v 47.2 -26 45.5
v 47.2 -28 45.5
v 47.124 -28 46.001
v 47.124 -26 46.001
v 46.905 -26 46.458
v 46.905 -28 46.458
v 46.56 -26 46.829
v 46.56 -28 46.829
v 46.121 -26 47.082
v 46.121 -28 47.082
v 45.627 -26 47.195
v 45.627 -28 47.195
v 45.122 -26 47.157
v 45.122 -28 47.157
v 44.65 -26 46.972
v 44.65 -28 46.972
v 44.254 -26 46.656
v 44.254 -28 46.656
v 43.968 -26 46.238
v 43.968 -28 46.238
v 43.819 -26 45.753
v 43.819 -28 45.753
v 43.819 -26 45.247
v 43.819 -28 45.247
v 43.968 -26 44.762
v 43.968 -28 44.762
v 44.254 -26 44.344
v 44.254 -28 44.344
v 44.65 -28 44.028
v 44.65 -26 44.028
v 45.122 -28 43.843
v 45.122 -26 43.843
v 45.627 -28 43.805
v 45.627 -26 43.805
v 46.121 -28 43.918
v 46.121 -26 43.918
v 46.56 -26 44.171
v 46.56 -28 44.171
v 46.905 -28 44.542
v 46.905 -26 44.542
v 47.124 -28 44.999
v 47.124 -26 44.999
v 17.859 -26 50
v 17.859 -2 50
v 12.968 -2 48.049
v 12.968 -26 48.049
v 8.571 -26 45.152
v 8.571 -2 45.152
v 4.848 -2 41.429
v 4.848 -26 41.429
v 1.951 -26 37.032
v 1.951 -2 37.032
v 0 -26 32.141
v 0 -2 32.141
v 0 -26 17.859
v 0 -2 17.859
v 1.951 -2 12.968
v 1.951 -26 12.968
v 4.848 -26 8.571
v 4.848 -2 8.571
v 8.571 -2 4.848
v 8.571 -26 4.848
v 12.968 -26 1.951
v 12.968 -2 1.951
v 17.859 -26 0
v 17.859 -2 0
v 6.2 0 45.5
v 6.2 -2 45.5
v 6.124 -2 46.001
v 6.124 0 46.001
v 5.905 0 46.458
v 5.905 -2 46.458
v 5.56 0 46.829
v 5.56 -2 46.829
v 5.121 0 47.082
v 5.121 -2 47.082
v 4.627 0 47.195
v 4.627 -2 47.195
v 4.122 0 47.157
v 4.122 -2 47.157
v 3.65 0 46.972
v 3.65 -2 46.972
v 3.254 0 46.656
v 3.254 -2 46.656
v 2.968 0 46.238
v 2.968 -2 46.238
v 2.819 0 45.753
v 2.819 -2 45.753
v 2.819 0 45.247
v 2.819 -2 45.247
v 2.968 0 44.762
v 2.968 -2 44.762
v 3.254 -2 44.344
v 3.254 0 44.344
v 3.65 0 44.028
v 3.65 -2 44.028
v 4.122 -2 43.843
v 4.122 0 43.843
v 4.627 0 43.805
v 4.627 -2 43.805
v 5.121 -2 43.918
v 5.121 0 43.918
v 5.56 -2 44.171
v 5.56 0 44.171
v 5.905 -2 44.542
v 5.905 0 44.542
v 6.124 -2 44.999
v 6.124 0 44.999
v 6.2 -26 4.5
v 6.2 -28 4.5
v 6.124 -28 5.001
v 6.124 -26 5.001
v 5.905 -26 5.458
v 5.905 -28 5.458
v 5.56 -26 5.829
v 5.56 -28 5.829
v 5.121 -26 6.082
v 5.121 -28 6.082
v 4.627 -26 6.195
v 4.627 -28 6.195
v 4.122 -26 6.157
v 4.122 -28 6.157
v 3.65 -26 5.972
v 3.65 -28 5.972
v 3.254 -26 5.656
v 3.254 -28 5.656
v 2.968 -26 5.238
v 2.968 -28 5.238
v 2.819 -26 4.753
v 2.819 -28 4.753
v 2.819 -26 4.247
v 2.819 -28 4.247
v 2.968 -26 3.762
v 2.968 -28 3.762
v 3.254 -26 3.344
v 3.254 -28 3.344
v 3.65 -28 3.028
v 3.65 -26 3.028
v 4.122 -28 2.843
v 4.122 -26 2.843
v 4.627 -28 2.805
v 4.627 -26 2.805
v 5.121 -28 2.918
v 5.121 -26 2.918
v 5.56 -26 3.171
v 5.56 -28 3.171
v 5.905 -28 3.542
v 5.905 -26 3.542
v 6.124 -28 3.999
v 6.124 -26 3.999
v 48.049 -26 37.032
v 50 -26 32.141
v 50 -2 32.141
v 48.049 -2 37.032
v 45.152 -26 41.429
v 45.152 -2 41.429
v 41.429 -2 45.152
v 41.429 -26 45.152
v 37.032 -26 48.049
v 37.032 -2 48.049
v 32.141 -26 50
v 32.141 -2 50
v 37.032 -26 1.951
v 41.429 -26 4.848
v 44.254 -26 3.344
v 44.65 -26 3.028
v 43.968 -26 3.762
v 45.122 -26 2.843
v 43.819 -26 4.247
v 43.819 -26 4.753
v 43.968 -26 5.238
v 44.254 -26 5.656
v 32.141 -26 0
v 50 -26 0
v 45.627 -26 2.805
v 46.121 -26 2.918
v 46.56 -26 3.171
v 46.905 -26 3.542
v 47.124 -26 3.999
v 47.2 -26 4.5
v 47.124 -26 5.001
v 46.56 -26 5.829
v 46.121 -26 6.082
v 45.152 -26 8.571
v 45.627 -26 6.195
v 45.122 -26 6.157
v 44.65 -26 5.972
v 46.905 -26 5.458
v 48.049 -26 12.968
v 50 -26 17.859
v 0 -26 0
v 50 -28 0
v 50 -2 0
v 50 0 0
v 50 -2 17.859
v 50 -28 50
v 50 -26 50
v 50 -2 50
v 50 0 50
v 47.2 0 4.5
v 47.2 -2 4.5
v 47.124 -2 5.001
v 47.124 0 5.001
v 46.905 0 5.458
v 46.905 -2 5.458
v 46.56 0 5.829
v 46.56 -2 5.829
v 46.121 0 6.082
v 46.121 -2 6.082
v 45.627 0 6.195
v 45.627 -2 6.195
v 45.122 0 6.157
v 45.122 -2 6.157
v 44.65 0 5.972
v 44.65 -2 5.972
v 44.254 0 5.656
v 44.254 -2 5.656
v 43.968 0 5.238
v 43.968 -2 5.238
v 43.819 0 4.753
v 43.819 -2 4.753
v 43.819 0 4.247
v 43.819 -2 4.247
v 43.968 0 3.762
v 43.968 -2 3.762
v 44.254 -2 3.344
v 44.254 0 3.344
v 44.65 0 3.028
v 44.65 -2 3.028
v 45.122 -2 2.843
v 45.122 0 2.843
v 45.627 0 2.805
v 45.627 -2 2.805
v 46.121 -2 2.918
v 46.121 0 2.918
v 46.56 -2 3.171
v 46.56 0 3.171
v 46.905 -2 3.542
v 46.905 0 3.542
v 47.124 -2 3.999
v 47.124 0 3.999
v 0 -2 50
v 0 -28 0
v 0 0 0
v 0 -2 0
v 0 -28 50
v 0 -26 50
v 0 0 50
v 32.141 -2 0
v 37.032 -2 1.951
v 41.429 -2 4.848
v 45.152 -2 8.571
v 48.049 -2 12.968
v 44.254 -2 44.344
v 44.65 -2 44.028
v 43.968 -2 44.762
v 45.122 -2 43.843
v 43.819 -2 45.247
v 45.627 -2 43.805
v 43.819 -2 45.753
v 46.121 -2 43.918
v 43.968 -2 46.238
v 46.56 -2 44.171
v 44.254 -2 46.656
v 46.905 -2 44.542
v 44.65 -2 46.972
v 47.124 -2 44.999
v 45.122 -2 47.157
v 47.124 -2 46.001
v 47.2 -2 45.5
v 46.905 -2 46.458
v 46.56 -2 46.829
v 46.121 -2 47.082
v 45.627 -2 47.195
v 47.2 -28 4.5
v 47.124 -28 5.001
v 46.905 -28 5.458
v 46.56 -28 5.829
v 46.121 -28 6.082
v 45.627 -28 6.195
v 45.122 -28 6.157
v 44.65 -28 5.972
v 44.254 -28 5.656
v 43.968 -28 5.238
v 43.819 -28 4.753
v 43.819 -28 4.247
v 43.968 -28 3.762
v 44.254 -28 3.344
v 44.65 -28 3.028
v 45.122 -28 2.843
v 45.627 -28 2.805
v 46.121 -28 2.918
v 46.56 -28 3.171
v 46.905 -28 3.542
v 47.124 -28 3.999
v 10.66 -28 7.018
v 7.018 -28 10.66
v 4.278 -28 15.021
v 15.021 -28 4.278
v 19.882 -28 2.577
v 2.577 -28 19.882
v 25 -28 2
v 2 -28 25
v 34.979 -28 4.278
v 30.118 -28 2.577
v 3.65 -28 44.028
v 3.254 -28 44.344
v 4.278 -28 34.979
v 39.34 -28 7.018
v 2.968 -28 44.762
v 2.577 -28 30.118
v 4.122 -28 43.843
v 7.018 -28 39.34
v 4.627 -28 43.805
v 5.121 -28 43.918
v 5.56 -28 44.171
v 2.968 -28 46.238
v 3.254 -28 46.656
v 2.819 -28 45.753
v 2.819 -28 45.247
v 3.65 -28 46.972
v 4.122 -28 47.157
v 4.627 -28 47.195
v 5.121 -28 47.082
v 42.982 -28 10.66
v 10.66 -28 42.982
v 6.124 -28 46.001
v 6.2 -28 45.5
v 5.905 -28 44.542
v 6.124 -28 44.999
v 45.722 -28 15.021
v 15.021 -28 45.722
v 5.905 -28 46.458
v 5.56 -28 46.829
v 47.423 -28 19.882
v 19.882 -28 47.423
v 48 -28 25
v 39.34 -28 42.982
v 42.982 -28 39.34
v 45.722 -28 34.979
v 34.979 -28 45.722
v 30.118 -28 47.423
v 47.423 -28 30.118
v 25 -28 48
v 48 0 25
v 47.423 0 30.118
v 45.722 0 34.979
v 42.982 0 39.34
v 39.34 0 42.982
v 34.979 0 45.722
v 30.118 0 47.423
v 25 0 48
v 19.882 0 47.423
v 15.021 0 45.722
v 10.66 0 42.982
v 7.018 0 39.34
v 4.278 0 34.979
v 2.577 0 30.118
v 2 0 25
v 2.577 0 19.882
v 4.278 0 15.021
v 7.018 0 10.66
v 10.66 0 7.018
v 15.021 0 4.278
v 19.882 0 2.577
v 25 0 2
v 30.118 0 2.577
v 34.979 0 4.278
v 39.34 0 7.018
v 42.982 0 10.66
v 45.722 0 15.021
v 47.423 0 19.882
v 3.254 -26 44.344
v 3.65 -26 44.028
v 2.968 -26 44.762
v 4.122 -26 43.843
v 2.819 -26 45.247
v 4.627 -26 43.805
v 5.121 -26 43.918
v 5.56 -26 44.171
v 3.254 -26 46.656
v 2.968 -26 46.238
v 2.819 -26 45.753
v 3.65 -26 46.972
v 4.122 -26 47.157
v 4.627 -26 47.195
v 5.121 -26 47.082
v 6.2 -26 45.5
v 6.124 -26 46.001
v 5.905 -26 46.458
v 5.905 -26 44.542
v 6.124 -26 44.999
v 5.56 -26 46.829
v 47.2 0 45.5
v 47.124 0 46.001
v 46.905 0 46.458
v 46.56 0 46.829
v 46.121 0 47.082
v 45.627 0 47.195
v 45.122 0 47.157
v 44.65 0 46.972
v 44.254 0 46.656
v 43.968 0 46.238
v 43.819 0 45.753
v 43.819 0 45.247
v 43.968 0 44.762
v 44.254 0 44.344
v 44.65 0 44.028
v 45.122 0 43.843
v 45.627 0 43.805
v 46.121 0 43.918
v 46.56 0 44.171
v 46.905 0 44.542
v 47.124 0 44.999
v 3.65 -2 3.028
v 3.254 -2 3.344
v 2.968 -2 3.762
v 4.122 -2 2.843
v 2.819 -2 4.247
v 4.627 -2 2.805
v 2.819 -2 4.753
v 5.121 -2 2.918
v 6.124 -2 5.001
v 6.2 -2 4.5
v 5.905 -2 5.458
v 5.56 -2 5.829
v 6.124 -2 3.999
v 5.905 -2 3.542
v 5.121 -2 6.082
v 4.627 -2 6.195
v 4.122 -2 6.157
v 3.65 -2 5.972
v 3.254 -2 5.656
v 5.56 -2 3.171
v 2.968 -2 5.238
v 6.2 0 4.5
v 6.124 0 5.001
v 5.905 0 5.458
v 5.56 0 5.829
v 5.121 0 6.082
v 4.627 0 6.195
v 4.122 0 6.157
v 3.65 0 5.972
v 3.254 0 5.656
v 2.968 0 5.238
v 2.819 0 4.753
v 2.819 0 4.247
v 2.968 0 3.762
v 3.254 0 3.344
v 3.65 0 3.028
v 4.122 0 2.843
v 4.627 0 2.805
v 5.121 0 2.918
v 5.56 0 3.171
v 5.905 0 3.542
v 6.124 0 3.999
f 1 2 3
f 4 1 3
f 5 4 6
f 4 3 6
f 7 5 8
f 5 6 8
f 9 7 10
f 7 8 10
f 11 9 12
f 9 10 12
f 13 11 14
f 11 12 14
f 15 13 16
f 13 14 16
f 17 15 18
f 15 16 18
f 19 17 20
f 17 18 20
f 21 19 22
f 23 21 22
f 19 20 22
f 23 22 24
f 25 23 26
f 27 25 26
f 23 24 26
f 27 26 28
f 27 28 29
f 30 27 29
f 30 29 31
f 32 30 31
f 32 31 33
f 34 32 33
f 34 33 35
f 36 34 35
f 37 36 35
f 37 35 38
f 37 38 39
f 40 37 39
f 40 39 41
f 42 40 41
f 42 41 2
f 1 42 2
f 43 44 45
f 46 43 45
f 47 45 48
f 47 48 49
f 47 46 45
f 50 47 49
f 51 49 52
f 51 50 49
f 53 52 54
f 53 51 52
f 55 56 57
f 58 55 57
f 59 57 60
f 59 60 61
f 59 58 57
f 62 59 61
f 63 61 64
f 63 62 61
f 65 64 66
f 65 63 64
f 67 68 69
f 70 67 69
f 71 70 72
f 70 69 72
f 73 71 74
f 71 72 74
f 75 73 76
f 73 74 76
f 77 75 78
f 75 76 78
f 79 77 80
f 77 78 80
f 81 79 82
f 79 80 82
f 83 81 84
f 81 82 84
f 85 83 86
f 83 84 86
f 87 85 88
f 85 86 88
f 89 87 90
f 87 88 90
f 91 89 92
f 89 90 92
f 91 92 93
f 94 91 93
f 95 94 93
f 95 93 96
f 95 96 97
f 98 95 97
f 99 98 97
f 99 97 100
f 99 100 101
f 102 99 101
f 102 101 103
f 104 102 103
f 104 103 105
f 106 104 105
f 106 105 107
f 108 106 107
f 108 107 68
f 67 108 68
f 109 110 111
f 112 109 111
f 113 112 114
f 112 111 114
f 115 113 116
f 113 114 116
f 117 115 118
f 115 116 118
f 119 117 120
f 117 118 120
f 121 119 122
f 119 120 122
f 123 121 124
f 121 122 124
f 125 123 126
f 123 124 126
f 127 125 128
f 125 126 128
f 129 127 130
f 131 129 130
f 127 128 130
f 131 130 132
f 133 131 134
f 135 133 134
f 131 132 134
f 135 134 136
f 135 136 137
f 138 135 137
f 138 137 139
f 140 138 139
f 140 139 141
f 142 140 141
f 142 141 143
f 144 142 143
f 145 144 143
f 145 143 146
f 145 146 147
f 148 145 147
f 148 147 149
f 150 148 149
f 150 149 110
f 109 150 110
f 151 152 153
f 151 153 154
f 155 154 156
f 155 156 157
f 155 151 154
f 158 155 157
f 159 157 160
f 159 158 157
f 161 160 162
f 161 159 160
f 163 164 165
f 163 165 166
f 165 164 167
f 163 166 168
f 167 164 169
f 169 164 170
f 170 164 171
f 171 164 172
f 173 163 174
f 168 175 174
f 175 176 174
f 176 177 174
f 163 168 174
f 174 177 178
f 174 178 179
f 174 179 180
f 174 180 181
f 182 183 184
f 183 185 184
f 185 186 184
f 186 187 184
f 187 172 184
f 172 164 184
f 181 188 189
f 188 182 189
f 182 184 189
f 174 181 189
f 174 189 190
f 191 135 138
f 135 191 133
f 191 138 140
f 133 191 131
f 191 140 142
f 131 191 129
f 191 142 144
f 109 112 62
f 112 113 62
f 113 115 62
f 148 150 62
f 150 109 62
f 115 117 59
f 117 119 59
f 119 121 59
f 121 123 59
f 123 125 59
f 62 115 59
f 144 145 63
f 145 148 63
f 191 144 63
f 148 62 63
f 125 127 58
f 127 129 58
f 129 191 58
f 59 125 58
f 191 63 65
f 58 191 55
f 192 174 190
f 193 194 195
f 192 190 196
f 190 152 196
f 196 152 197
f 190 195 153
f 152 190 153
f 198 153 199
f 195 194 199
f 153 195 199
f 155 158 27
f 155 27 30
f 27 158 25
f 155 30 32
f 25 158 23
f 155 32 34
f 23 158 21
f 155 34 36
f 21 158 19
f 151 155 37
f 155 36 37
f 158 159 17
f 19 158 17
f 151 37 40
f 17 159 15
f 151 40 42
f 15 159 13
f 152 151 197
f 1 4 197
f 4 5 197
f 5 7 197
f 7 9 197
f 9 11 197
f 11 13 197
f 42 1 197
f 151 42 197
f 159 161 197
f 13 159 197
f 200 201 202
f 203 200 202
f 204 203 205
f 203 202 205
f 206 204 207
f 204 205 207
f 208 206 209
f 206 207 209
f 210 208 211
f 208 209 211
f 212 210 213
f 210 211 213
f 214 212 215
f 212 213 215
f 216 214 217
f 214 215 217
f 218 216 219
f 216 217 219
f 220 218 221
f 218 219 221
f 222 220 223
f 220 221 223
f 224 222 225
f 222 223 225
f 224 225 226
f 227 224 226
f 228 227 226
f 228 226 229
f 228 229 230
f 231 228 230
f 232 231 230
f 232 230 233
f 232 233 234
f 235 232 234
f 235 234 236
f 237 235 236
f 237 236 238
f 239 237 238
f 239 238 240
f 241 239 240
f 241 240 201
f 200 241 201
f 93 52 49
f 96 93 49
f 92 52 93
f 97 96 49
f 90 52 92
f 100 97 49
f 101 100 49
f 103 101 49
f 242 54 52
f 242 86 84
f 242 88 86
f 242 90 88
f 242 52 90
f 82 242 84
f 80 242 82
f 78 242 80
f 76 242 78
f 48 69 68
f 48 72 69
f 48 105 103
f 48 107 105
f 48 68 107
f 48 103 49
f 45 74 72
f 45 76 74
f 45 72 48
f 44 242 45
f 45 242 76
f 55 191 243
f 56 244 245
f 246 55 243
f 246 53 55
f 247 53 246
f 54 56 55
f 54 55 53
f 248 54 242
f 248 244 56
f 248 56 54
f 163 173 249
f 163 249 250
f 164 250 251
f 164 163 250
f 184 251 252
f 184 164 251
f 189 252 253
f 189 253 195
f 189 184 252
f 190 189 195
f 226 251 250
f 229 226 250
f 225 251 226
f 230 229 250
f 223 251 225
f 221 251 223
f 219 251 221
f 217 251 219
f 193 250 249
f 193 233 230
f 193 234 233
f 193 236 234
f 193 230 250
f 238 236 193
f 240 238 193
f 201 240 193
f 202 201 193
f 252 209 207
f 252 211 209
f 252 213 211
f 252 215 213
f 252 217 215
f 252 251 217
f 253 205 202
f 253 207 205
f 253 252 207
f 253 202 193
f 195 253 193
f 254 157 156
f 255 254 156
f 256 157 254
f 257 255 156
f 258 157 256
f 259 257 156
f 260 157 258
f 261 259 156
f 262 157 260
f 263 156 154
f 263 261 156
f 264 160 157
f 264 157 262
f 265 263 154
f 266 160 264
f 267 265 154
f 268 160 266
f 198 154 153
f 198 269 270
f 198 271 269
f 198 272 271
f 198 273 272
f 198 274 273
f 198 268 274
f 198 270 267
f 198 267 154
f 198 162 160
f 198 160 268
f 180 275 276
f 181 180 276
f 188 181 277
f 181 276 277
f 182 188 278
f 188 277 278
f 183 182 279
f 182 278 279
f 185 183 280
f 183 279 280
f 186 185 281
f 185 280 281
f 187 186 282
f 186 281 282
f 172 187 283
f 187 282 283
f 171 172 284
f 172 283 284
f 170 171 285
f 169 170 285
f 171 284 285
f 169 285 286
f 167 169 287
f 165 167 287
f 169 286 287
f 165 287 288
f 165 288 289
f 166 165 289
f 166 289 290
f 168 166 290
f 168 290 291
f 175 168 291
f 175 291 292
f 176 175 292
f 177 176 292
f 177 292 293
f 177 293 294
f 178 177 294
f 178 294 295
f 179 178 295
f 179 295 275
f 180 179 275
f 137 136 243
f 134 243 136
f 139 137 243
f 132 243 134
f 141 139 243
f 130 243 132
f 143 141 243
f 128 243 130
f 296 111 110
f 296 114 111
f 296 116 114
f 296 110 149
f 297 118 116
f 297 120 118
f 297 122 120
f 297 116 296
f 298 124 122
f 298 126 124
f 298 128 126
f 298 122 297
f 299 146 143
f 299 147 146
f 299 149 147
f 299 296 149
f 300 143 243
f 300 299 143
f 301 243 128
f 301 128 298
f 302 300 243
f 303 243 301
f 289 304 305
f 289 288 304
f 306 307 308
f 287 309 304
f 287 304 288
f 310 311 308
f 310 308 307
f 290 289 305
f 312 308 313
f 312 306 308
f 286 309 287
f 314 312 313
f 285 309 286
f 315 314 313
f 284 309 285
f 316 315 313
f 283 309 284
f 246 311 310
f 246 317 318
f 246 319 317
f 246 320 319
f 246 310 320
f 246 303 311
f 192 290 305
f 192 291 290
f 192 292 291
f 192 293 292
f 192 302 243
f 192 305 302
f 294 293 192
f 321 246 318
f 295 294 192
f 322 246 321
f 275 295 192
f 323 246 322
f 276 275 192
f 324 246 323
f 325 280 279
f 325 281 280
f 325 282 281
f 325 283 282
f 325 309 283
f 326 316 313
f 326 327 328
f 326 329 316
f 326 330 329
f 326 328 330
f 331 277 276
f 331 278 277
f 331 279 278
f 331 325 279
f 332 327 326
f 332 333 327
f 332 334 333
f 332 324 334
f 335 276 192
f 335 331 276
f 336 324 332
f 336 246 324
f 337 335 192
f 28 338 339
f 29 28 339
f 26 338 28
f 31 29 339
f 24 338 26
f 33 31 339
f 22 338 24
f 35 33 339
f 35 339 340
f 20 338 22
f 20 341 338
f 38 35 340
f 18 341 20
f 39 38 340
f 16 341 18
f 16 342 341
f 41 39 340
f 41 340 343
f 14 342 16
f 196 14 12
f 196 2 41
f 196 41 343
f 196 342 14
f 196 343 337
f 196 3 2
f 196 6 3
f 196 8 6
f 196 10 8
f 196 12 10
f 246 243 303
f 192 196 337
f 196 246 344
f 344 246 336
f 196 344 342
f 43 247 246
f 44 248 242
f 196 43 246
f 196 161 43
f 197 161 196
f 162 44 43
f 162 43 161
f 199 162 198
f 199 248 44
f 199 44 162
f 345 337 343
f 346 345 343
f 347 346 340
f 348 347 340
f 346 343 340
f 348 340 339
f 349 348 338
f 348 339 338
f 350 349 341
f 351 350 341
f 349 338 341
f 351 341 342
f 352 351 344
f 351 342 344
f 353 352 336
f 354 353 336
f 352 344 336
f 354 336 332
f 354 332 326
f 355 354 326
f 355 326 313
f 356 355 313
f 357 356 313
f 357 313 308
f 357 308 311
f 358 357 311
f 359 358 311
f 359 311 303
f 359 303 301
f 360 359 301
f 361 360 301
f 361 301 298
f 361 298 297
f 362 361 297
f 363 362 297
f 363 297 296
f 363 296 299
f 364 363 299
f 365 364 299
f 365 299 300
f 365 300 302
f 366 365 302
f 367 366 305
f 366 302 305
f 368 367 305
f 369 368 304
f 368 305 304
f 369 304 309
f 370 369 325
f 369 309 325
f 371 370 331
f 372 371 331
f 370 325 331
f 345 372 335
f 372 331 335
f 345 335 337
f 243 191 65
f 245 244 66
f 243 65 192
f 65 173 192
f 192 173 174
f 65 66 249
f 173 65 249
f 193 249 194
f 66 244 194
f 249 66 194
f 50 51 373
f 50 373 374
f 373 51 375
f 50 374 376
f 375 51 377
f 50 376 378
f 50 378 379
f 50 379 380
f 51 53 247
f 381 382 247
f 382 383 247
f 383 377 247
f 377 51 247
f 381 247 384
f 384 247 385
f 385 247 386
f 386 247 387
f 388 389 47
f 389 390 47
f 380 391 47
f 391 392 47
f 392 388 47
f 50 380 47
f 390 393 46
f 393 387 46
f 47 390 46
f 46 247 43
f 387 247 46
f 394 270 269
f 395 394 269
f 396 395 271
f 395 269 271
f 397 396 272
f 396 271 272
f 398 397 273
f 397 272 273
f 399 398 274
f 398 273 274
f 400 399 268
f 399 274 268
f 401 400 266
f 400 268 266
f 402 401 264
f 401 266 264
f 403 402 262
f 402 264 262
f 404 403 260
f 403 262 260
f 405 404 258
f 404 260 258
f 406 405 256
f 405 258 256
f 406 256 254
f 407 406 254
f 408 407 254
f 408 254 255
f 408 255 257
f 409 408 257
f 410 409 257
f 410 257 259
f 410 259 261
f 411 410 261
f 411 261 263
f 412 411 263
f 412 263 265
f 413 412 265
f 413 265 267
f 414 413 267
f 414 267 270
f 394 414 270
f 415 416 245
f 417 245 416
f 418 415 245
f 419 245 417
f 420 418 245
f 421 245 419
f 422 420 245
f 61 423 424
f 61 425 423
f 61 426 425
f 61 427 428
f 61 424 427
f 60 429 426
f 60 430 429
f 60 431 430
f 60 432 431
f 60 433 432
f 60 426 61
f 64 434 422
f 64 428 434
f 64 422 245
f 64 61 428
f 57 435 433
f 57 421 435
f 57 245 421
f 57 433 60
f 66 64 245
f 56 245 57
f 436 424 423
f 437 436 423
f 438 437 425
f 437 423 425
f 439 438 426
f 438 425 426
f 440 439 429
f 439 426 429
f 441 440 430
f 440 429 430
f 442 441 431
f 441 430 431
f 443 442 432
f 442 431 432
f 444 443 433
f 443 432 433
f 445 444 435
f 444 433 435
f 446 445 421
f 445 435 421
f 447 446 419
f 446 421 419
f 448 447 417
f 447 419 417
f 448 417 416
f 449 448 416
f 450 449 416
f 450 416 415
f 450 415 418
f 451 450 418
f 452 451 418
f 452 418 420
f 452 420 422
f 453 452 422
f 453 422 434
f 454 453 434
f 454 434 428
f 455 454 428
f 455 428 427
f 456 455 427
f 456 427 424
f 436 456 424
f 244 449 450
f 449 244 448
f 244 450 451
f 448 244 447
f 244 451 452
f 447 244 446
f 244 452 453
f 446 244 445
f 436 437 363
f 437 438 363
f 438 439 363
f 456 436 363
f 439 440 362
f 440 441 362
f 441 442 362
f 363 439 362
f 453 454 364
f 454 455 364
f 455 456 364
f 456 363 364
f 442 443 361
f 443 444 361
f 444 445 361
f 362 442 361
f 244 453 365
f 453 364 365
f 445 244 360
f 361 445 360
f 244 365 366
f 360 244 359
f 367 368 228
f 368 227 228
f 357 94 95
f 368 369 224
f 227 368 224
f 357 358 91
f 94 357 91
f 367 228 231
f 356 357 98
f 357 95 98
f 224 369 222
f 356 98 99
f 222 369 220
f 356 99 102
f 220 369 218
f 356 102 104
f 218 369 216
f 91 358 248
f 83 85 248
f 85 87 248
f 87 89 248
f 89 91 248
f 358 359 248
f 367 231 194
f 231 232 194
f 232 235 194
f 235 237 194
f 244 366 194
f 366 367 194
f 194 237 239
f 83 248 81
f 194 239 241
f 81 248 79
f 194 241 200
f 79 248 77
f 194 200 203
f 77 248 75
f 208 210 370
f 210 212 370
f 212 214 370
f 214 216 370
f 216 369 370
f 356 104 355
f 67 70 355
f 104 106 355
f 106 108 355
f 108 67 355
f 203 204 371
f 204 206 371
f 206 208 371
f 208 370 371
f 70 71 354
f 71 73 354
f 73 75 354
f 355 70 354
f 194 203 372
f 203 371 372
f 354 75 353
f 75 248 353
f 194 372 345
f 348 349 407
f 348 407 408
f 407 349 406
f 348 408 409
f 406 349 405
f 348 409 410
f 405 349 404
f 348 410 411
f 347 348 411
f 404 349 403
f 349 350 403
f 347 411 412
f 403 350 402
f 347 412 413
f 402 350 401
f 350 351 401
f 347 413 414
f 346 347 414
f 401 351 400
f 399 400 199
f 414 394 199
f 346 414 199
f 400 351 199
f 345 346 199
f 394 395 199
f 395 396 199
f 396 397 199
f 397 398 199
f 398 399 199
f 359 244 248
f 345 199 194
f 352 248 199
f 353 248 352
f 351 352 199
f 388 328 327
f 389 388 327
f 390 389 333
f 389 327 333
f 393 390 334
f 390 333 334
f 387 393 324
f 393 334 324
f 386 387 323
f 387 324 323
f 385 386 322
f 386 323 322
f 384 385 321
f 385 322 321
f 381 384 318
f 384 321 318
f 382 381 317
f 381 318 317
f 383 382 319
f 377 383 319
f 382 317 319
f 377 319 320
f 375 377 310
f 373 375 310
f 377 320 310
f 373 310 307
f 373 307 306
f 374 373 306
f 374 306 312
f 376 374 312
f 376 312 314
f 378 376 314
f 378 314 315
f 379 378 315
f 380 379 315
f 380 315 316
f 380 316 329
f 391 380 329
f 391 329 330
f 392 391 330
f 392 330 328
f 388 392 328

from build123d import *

# Parameters (mm, degrees)
SKETCH_W        = 50
SKETCH_H        = 50
PAD_DEPTH       = 28
SKETCH001_R     = 23
SKETCH001_R_2   = 1.7
POCKET_DEPTH    = 40
SKETCH002_W     = 75.459096
SKETCH002_H     = 67.94658
SKETCH002_R     = 26
POCKET001_DEPTH = 24


with BuildPart() as part:
    # Sketch → Pad (new body)
    with BuildSketch(Plane.XZ):
        with Locations((25, 25)):
            Rectangle(SKETCH_W, SKETCH_H)
    extrude(amount=PAD_DEPTH)

    # Sketch001 (on Face6 of Pad) → Pocket (cut)
    with BuildSketch(Plane.XZ.offset(28)):
        with Locations((25, 25)):
            Circle(SKETCH001_R)
        with Locations((4.5, 45.5)):
            Circle(SKETCH001_R_2)
        with Locations((4.5, 4.5)):
            Circle(SKETCH001_R_2)
        with Locations((45.5, 4.5)):
            Circle(SKETCH001_R_2)
        with Locations((45.5, 45.5)):
            Circle(SKETCH001_R_2)
    extrude(amount=-POCKET_DEPTH, mode=Mode.SUBTRACT)

    # Sketch002 (on DatumPlane) → Pocket001 (cut)
    with BuildSketch(Plane.XZ.offset(26)):
        with Locations((26.273557, 24.507667)):
            Rectangle(SKETCH002_W, SKETCH002_H)
        with Locations((25, 25)):
            Circle(SKETCH002_R, mode=Mode.SUBTRACT)
    extrude(amount=-POCKET001_DEPTH, mode=Mode.SUBTRACT)


solid = part.part
